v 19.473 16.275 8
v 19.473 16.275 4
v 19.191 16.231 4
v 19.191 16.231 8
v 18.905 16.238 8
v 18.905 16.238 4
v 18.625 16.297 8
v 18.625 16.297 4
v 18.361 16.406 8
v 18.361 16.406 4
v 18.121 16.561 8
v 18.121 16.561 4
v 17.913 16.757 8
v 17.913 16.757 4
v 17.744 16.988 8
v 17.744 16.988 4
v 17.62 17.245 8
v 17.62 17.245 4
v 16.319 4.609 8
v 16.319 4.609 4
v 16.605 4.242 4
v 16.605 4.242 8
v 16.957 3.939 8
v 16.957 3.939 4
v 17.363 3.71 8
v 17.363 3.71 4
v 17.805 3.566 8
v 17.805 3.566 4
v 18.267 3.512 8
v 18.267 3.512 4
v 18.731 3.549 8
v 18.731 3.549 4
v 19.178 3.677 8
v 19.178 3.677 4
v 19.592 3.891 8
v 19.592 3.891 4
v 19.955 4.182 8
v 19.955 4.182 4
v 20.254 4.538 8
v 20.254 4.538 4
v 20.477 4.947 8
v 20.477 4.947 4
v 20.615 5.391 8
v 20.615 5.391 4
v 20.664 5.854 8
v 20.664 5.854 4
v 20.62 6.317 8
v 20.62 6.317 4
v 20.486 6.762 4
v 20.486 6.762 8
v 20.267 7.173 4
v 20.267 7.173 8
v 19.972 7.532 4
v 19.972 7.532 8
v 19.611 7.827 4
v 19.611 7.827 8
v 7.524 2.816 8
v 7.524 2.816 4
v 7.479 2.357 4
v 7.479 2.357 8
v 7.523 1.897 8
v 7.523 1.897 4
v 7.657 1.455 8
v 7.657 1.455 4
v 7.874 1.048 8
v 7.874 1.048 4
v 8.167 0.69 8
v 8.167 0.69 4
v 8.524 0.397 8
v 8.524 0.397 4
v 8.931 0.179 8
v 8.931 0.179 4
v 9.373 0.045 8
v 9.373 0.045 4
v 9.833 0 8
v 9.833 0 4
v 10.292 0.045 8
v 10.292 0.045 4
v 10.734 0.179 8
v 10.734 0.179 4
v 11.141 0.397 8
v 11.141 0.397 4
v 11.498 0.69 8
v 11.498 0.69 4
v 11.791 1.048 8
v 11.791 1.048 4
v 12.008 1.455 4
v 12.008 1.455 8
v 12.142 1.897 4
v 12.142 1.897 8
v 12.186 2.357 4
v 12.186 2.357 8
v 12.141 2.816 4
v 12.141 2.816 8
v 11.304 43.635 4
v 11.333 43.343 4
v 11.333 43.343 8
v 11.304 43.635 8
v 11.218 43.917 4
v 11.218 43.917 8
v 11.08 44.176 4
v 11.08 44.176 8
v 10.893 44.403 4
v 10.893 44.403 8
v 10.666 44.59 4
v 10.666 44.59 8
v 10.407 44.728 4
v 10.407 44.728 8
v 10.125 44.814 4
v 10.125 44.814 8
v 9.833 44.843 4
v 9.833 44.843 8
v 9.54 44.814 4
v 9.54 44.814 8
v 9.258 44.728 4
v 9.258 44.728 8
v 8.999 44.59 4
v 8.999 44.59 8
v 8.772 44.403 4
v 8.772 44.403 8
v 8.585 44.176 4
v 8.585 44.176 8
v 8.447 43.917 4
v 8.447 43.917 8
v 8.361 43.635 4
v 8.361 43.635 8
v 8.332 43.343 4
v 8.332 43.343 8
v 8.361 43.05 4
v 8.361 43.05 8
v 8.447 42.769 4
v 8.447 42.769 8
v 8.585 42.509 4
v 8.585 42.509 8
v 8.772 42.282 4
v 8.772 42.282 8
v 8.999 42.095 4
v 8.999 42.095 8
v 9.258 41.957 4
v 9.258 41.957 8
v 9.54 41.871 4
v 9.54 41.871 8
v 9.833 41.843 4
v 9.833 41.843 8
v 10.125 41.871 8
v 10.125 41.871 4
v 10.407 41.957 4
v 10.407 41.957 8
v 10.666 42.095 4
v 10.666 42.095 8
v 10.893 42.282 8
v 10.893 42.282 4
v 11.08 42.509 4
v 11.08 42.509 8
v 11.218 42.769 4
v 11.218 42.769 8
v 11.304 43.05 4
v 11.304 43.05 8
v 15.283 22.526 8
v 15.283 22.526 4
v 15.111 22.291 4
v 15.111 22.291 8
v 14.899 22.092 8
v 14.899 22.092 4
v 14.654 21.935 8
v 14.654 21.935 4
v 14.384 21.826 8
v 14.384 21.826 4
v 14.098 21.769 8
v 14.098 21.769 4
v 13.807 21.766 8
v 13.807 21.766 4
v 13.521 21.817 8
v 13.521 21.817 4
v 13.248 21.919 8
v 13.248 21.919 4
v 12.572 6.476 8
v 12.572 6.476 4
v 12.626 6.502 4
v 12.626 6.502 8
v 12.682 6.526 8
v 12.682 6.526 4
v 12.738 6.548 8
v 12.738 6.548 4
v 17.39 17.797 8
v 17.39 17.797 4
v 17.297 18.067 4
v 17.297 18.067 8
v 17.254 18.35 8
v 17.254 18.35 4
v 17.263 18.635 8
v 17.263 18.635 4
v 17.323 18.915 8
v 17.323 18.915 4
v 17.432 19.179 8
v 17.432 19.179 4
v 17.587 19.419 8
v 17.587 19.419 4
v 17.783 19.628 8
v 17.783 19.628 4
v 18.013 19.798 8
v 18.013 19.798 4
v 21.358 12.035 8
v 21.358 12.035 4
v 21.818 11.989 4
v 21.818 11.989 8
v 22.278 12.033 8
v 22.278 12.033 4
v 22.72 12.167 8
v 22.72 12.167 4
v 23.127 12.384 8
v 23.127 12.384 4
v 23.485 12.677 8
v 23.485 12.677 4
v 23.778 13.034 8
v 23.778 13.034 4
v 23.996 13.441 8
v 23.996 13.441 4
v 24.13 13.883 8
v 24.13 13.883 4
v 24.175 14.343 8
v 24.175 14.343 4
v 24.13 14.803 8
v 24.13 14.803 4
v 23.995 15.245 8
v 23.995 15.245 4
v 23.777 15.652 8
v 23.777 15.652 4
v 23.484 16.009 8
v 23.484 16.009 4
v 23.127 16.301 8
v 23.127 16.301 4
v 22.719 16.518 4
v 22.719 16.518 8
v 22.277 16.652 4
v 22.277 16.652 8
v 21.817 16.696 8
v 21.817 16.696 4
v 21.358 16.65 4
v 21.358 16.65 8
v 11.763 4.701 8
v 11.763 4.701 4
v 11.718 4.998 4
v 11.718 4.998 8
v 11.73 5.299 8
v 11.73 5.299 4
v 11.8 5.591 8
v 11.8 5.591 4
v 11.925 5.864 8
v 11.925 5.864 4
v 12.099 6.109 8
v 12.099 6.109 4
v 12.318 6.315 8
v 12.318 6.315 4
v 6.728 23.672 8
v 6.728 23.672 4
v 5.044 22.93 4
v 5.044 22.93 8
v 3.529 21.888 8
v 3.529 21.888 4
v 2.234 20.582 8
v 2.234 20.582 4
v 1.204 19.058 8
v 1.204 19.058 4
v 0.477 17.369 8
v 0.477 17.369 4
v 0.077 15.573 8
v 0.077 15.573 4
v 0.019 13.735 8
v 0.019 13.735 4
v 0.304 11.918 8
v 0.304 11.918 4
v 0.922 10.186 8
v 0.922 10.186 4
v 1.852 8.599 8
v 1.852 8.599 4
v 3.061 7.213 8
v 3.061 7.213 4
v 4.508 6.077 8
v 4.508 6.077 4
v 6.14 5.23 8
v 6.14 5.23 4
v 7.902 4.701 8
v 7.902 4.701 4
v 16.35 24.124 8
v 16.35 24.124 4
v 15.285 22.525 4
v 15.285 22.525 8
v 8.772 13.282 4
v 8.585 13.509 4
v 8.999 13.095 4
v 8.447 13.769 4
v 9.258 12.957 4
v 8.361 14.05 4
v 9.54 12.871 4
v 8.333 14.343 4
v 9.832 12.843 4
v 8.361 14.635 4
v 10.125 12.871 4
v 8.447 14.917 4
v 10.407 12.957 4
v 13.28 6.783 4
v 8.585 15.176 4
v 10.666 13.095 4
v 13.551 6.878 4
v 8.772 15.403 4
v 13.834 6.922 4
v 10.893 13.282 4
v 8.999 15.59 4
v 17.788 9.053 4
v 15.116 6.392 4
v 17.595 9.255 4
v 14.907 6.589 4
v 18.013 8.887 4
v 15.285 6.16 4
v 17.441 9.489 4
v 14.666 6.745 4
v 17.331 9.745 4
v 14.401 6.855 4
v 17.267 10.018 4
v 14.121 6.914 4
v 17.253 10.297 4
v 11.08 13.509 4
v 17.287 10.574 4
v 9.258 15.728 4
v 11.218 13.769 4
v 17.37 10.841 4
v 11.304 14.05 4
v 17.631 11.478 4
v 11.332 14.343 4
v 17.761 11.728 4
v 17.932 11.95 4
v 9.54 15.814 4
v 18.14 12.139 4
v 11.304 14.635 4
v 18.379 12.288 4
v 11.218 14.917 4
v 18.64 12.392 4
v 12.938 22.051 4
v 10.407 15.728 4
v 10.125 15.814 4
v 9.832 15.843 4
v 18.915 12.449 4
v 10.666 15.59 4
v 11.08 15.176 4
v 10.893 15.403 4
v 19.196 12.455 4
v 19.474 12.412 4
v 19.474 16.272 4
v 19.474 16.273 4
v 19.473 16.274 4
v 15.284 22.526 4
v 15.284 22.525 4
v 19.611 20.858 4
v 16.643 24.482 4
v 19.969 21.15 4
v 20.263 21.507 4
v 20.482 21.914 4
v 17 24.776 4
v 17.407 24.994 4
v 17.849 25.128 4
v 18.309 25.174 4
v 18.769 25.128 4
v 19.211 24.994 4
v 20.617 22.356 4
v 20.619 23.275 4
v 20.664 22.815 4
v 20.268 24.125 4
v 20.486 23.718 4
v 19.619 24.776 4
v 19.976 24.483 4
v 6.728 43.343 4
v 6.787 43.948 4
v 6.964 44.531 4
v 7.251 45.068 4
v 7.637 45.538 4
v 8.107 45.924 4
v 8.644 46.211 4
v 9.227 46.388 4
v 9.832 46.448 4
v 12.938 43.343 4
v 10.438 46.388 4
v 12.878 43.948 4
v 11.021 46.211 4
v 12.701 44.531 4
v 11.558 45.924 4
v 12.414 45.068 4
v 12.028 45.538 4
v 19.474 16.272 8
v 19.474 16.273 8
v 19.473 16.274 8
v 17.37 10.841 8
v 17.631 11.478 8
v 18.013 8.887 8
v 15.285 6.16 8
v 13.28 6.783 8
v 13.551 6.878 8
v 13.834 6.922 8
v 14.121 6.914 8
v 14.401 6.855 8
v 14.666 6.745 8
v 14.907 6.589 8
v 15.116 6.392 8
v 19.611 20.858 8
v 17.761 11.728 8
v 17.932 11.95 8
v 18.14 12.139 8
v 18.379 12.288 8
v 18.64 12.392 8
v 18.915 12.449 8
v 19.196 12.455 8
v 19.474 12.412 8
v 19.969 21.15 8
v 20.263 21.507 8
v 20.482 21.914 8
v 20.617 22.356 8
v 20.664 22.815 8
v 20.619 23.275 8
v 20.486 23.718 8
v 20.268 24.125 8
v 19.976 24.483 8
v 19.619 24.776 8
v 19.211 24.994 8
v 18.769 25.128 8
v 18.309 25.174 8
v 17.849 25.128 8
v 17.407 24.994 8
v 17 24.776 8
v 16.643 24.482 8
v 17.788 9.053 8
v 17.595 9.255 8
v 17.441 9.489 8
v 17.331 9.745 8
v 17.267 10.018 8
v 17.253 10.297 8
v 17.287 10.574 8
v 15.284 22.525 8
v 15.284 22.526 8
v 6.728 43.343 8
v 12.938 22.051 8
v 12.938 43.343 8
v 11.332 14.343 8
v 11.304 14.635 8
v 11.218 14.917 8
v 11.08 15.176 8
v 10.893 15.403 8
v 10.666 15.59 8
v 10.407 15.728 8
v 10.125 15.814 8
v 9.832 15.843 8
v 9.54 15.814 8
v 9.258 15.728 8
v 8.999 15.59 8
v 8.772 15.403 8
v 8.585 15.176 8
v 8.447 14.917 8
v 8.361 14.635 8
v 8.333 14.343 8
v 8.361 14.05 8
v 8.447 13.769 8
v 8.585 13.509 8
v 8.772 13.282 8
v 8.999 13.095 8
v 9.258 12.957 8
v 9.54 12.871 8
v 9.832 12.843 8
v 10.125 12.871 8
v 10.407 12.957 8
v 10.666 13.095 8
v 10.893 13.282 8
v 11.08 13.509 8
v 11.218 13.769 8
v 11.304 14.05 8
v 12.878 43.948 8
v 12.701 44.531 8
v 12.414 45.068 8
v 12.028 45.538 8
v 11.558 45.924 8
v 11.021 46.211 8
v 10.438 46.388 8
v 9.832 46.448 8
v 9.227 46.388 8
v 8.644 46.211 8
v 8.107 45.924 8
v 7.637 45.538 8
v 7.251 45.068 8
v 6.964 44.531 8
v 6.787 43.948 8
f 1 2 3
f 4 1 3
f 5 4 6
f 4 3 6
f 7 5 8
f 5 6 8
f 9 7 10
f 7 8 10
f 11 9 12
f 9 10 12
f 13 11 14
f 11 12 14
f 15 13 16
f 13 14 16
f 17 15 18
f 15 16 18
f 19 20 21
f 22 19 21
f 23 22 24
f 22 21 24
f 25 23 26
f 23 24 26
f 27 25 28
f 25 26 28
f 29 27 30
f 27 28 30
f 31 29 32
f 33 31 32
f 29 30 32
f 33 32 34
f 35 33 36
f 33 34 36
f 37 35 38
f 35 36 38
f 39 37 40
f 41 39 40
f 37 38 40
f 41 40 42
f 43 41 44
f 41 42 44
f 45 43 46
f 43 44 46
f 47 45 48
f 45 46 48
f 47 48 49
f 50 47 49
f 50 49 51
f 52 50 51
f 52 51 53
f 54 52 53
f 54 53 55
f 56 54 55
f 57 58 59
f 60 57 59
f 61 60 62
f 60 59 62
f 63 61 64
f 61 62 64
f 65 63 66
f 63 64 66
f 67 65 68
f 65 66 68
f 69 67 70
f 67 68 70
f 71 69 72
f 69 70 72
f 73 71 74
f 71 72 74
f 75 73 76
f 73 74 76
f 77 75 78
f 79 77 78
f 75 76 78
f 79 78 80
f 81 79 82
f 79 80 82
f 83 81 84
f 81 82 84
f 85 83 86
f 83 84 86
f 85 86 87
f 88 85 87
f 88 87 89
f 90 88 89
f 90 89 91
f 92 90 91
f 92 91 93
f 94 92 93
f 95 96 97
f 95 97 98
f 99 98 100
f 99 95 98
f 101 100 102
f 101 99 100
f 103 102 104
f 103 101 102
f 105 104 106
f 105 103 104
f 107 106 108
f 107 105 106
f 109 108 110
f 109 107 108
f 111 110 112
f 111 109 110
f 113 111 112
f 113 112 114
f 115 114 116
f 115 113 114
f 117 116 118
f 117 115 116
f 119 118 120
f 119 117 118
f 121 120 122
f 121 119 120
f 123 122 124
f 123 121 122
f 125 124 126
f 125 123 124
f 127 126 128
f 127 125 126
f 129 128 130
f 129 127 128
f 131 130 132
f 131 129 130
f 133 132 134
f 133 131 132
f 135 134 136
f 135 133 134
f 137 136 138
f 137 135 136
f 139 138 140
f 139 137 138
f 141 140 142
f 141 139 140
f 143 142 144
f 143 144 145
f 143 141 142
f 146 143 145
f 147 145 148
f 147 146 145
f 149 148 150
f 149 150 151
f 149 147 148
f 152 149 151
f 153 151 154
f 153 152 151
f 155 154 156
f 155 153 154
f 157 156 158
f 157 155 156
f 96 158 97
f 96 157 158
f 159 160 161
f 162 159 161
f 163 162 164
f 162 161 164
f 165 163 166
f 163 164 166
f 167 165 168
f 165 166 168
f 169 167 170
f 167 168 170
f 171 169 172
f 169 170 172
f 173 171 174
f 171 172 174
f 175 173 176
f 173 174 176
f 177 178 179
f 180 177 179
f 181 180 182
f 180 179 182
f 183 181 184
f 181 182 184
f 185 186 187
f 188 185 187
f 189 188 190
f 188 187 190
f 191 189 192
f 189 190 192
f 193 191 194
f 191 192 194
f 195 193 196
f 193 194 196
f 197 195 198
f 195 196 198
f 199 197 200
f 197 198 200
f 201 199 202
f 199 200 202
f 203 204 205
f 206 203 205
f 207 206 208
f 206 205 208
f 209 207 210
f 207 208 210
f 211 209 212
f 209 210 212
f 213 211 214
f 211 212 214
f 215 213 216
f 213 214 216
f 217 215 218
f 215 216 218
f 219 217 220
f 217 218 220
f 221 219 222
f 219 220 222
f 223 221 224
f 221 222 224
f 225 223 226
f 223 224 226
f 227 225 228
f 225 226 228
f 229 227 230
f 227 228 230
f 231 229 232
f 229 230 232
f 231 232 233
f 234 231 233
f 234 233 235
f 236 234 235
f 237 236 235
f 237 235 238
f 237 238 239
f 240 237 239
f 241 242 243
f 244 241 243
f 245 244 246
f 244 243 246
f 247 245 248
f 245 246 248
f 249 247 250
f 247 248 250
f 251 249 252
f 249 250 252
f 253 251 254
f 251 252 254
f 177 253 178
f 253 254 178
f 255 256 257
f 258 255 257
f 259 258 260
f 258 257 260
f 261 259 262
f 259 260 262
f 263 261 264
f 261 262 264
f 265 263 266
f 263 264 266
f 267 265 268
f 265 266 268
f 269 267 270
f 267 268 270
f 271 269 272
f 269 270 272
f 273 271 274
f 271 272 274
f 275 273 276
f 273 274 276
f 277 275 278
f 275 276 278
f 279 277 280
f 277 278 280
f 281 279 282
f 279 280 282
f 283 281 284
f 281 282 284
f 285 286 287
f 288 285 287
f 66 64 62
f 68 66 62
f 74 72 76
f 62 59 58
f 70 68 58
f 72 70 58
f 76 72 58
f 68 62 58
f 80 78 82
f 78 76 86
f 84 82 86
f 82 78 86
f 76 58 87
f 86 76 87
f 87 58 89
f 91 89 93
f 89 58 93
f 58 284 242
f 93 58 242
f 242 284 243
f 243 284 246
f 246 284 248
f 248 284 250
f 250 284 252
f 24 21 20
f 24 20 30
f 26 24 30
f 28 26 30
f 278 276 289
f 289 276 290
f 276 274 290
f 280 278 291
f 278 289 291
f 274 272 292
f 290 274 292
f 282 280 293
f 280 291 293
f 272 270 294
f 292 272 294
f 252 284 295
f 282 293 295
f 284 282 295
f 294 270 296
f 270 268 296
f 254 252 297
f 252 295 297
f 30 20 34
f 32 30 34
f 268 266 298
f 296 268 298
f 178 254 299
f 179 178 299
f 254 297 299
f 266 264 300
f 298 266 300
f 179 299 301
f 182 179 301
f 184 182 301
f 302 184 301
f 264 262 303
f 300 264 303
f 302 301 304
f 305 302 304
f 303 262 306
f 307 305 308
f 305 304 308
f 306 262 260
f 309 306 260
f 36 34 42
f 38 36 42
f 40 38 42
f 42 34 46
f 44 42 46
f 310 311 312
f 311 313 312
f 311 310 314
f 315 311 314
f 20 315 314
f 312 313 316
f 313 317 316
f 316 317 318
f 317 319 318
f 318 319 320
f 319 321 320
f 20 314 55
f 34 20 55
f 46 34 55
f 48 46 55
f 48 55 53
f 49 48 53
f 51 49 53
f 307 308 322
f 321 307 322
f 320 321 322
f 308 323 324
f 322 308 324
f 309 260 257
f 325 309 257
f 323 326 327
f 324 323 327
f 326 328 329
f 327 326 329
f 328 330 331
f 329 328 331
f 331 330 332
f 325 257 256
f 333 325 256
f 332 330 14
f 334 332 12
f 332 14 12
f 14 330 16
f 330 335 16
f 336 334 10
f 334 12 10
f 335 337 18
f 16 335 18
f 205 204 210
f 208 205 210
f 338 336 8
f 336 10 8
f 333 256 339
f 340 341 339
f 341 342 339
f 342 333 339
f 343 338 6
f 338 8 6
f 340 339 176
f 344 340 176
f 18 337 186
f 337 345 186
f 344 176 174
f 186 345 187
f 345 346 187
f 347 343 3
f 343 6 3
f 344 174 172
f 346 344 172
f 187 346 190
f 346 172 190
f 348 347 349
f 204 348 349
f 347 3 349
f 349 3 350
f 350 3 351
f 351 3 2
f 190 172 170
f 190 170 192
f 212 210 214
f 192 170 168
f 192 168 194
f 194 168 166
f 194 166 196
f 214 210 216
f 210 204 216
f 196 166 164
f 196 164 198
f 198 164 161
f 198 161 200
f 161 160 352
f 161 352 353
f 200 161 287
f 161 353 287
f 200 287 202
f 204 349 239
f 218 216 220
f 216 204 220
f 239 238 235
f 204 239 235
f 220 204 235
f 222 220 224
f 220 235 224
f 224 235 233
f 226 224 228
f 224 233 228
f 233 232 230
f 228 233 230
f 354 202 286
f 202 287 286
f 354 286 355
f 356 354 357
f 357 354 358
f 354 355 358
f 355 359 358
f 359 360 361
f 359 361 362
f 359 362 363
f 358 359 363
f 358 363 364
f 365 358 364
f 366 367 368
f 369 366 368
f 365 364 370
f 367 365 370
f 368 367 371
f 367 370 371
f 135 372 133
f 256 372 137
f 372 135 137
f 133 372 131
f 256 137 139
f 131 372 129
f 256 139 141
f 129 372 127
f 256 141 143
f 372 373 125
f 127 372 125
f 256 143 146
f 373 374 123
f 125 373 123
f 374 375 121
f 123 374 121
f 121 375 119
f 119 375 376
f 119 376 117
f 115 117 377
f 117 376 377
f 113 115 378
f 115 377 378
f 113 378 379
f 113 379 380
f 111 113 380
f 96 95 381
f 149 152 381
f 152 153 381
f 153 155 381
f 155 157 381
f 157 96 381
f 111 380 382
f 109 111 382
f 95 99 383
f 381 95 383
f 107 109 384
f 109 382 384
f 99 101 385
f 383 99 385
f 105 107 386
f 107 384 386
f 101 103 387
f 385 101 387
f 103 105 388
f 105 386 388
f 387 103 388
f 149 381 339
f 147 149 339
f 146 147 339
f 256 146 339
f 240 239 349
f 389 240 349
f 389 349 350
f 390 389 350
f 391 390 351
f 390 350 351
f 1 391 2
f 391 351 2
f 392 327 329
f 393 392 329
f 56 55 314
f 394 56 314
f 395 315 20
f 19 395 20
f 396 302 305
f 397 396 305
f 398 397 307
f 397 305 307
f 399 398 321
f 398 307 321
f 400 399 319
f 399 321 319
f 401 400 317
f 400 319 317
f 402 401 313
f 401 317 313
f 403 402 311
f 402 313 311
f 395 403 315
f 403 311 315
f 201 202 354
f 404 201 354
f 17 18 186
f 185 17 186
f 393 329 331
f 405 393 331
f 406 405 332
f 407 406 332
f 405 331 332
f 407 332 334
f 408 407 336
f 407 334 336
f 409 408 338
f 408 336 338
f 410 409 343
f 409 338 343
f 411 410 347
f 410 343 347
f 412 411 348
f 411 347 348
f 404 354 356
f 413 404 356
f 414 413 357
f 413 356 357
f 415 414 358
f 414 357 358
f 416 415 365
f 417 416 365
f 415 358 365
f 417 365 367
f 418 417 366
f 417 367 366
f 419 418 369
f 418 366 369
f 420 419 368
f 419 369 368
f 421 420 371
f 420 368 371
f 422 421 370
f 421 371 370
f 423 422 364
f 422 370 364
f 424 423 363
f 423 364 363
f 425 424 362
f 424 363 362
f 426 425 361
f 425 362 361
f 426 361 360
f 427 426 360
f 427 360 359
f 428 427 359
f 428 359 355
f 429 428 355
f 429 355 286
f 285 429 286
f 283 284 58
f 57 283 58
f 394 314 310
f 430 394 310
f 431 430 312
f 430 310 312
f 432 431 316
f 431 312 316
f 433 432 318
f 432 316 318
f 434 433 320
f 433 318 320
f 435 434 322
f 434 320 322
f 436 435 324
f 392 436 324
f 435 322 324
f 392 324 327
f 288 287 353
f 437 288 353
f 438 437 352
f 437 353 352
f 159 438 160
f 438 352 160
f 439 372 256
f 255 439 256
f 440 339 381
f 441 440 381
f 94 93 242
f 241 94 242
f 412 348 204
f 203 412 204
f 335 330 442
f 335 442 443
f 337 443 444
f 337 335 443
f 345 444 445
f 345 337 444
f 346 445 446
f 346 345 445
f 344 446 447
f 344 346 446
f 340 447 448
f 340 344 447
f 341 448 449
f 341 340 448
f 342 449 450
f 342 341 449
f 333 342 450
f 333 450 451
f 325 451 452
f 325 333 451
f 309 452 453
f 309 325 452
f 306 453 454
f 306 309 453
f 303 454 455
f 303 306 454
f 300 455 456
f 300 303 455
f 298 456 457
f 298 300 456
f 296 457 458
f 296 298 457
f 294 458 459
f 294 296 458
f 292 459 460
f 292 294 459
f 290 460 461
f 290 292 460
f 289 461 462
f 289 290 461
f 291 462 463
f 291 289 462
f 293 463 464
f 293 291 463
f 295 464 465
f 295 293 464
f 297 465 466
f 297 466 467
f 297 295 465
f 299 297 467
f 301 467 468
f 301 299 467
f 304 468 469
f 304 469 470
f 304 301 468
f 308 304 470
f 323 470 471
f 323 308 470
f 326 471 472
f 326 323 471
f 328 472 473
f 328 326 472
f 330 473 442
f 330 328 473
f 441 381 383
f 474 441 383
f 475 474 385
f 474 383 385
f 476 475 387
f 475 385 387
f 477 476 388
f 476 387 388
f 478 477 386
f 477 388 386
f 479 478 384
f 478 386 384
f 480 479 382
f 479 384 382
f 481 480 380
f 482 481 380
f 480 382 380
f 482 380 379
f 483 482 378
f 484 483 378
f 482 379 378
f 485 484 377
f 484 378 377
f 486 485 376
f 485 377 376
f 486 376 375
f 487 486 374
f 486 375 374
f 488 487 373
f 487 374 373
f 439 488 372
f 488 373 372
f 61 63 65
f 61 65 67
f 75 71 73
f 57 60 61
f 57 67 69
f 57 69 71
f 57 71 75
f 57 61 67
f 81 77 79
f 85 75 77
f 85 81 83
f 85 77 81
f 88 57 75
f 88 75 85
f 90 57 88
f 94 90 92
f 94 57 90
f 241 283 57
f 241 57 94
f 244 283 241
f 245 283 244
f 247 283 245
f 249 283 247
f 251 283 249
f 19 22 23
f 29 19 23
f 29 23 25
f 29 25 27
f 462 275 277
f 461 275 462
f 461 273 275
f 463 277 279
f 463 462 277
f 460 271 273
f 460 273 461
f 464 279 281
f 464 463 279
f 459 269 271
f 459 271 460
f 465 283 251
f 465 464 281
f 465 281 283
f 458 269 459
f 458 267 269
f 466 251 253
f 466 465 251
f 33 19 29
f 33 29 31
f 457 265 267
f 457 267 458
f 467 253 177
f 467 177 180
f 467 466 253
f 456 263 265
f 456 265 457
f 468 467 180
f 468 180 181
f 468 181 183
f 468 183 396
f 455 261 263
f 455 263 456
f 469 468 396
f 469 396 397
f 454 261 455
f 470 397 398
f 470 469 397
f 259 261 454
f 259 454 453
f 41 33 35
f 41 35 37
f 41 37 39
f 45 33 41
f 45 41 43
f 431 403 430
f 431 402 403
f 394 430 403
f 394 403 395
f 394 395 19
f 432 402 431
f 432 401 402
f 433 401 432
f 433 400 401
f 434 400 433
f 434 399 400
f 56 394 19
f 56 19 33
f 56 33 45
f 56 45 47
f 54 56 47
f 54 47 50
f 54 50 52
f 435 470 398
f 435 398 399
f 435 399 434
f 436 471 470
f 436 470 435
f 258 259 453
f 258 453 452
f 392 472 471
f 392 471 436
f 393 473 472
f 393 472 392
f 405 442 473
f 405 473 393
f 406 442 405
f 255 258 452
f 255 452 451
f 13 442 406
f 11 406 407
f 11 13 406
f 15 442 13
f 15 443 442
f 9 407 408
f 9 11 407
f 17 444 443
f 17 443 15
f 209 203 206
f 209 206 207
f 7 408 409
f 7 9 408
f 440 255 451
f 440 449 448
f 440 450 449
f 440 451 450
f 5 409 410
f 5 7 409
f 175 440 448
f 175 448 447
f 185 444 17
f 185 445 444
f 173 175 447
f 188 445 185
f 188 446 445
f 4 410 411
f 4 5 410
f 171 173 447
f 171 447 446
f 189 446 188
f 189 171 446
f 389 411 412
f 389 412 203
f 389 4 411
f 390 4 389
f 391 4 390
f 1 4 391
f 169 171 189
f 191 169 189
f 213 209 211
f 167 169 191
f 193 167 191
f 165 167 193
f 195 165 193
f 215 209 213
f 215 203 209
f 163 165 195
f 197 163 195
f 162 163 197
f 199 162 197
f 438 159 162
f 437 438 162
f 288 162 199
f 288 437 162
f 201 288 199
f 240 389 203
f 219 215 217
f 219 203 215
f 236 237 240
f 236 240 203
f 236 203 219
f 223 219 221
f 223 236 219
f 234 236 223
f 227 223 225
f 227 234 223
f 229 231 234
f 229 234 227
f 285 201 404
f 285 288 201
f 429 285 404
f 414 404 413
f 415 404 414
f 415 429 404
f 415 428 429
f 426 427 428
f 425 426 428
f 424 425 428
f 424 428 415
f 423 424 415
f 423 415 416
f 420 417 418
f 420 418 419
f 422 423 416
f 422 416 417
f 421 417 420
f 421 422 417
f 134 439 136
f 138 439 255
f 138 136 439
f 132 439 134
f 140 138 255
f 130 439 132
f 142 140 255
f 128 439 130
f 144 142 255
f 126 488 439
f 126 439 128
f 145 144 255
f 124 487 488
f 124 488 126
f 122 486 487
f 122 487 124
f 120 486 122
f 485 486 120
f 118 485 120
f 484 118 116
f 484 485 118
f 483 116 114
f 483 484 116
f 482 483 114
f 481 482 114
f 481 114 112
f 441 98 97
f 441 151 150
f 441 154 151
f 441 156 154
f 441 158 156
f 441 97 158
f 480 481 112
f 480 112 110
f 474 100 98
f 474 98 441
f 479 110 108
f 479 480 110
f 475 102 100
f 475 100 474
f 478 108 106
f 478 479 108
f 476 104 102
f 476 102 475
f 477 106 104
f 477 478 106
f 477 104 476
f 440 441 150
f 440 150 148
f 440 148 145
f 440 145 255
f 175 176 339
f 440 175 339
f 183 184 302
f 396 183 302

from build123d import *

# Parameters (mm, degrees)
SKETCH1_R           = 1.49999983
SKETCH1_R_2         = 1.50000021
BOSS_EXTRUDE5_DEPTH = 4


# Read off the part's stored shape, not the designer's step: Imported1
with BuildPart() as part:
    # Sketch1 → Boss-Extrude5 (new body)
    with BuildSketch(Plane.XY.offset(4.00000019)):
        with BuildLine():
            ThreePointArc((12.937500142, 43.342541903), (9.832499729, 46.447540761), (6.727500353, 43.342540866))
            Line((6.727500353, 43.342540866), (6.727500353, 23.671906441))
            ThreePointArc((6.727500353, 23.671906441), (0.018793936, 13.734902419), (7.902105327, 4.701398545))
            Line((7.902105327, 4.701398545), (7.524421789, 2.816406275))
            ThreePointArc((7.524421789, 2.816406275), (9.832500014, -5.9e-08), (12.14057824, 2.816406275))
            Line((12.14057824, 2.816406275), (11.762894778, 4.701398162))
            ThreePointArc((11.762894778, 4.701398162), (11.855672679, 5.730610746), (12.571502338, 6.475912151))
            ThreePointArc((12.571502338, 6.475912151), (12.653825046, 6.514541951), (12.738259166, 6.548308343))
            Line((12.738259166, 6.548308343), (13.279813023, 6.783419776))
            ThreePointArc((13.279813023, 6.783419776), (14.401344572, 6.854545961), (15.285156295, 6.160450299))
            Line((15.285156295, 6.160450299), (16.318864329, 4.609298912))
            ThreePointArc((16.318864329, 4.609298912), (19.954946163, 4.181790528), (19.61122341, 7.826747207))
            Line((19.61122341, 7.826747207), (18.012888788, 8.887330785))
            ThreePointArc((18.012888788, 8.887330785), (17.330815892, 9.745478763), (17.369938897, 10.840974441))
            Line((17.369938897, 10.840974441), (17.631297478, 11.478005982))
            ThreePointArc((17.631297478, 11.478005982), (18.378744789, 12.287790328), (19.473690584, 12.412377153))
            Line((19.473690584, 12.412377153), (21.358352668, 12.034519282))
            ThreePointArc((21.358352668, 12.034519282), (24.175042258, 14.342908104), (21.357632561, 16.650417974))
            Line((21.357632561, 16.650417974), (19.473808661, 16.272116711))
            ThreePointArc((19.473808661, 16.272116711), (19.473514795, 16.273584463), (19.473220705, 16.27505217))
            ThreePointArc((19.473220705, 16.27505217), (18.361090509, 16.40624384), (17.619571753, 17.245406971))
            Line((17.619571753, 17.245406971), (17.390357149, 17.796567545))
            ThreePointArc((17.390357149, 17.796567545), (17.322929979, 18.914964617), (18.012888788, 19.79775297))
            Line((18.012888788, 19.79775297), (19.611220282, 20.858331838))
            ThreePointArc((19.611220282, 20.858331838), (19.975539072, 24.482917782), (16.35037502, 24.124397156))
            Line((16.35037502, 24.124397156), (15.285156295, 22.524633456))
            ThreePointArc((15.285156295, 22.524633456), (15.284091495, 22.525342953), (15.283026603, 22.526052311))
            ThreePointArc((15.283026603, 22.526052311), (14.383790145, 21.826291172), (13.248170262, 21.919346761))
            Line((13.248170262, 21.919346761), (12.937500142, 22.051239386))
            Line((12.937500142, 22.051239386), (12.937500142, 23.67190695))
            Line((12.937500142, 23.67190695), (12.937500142, 43.342541903))
        make_face()
        with Locations((9.832499965, 14.342541504)):
            Circle(SKETCH1_R, mode=Mode.SUBTRACT)
        with Locations((9.832500097, 43.342539793)):
            Circle(SKETCH1_R_2, mode=Mode.SUBTRACT)
    extrude(amount=BOSS_EXTRUDE5_DEPTH)


solid = part.part
